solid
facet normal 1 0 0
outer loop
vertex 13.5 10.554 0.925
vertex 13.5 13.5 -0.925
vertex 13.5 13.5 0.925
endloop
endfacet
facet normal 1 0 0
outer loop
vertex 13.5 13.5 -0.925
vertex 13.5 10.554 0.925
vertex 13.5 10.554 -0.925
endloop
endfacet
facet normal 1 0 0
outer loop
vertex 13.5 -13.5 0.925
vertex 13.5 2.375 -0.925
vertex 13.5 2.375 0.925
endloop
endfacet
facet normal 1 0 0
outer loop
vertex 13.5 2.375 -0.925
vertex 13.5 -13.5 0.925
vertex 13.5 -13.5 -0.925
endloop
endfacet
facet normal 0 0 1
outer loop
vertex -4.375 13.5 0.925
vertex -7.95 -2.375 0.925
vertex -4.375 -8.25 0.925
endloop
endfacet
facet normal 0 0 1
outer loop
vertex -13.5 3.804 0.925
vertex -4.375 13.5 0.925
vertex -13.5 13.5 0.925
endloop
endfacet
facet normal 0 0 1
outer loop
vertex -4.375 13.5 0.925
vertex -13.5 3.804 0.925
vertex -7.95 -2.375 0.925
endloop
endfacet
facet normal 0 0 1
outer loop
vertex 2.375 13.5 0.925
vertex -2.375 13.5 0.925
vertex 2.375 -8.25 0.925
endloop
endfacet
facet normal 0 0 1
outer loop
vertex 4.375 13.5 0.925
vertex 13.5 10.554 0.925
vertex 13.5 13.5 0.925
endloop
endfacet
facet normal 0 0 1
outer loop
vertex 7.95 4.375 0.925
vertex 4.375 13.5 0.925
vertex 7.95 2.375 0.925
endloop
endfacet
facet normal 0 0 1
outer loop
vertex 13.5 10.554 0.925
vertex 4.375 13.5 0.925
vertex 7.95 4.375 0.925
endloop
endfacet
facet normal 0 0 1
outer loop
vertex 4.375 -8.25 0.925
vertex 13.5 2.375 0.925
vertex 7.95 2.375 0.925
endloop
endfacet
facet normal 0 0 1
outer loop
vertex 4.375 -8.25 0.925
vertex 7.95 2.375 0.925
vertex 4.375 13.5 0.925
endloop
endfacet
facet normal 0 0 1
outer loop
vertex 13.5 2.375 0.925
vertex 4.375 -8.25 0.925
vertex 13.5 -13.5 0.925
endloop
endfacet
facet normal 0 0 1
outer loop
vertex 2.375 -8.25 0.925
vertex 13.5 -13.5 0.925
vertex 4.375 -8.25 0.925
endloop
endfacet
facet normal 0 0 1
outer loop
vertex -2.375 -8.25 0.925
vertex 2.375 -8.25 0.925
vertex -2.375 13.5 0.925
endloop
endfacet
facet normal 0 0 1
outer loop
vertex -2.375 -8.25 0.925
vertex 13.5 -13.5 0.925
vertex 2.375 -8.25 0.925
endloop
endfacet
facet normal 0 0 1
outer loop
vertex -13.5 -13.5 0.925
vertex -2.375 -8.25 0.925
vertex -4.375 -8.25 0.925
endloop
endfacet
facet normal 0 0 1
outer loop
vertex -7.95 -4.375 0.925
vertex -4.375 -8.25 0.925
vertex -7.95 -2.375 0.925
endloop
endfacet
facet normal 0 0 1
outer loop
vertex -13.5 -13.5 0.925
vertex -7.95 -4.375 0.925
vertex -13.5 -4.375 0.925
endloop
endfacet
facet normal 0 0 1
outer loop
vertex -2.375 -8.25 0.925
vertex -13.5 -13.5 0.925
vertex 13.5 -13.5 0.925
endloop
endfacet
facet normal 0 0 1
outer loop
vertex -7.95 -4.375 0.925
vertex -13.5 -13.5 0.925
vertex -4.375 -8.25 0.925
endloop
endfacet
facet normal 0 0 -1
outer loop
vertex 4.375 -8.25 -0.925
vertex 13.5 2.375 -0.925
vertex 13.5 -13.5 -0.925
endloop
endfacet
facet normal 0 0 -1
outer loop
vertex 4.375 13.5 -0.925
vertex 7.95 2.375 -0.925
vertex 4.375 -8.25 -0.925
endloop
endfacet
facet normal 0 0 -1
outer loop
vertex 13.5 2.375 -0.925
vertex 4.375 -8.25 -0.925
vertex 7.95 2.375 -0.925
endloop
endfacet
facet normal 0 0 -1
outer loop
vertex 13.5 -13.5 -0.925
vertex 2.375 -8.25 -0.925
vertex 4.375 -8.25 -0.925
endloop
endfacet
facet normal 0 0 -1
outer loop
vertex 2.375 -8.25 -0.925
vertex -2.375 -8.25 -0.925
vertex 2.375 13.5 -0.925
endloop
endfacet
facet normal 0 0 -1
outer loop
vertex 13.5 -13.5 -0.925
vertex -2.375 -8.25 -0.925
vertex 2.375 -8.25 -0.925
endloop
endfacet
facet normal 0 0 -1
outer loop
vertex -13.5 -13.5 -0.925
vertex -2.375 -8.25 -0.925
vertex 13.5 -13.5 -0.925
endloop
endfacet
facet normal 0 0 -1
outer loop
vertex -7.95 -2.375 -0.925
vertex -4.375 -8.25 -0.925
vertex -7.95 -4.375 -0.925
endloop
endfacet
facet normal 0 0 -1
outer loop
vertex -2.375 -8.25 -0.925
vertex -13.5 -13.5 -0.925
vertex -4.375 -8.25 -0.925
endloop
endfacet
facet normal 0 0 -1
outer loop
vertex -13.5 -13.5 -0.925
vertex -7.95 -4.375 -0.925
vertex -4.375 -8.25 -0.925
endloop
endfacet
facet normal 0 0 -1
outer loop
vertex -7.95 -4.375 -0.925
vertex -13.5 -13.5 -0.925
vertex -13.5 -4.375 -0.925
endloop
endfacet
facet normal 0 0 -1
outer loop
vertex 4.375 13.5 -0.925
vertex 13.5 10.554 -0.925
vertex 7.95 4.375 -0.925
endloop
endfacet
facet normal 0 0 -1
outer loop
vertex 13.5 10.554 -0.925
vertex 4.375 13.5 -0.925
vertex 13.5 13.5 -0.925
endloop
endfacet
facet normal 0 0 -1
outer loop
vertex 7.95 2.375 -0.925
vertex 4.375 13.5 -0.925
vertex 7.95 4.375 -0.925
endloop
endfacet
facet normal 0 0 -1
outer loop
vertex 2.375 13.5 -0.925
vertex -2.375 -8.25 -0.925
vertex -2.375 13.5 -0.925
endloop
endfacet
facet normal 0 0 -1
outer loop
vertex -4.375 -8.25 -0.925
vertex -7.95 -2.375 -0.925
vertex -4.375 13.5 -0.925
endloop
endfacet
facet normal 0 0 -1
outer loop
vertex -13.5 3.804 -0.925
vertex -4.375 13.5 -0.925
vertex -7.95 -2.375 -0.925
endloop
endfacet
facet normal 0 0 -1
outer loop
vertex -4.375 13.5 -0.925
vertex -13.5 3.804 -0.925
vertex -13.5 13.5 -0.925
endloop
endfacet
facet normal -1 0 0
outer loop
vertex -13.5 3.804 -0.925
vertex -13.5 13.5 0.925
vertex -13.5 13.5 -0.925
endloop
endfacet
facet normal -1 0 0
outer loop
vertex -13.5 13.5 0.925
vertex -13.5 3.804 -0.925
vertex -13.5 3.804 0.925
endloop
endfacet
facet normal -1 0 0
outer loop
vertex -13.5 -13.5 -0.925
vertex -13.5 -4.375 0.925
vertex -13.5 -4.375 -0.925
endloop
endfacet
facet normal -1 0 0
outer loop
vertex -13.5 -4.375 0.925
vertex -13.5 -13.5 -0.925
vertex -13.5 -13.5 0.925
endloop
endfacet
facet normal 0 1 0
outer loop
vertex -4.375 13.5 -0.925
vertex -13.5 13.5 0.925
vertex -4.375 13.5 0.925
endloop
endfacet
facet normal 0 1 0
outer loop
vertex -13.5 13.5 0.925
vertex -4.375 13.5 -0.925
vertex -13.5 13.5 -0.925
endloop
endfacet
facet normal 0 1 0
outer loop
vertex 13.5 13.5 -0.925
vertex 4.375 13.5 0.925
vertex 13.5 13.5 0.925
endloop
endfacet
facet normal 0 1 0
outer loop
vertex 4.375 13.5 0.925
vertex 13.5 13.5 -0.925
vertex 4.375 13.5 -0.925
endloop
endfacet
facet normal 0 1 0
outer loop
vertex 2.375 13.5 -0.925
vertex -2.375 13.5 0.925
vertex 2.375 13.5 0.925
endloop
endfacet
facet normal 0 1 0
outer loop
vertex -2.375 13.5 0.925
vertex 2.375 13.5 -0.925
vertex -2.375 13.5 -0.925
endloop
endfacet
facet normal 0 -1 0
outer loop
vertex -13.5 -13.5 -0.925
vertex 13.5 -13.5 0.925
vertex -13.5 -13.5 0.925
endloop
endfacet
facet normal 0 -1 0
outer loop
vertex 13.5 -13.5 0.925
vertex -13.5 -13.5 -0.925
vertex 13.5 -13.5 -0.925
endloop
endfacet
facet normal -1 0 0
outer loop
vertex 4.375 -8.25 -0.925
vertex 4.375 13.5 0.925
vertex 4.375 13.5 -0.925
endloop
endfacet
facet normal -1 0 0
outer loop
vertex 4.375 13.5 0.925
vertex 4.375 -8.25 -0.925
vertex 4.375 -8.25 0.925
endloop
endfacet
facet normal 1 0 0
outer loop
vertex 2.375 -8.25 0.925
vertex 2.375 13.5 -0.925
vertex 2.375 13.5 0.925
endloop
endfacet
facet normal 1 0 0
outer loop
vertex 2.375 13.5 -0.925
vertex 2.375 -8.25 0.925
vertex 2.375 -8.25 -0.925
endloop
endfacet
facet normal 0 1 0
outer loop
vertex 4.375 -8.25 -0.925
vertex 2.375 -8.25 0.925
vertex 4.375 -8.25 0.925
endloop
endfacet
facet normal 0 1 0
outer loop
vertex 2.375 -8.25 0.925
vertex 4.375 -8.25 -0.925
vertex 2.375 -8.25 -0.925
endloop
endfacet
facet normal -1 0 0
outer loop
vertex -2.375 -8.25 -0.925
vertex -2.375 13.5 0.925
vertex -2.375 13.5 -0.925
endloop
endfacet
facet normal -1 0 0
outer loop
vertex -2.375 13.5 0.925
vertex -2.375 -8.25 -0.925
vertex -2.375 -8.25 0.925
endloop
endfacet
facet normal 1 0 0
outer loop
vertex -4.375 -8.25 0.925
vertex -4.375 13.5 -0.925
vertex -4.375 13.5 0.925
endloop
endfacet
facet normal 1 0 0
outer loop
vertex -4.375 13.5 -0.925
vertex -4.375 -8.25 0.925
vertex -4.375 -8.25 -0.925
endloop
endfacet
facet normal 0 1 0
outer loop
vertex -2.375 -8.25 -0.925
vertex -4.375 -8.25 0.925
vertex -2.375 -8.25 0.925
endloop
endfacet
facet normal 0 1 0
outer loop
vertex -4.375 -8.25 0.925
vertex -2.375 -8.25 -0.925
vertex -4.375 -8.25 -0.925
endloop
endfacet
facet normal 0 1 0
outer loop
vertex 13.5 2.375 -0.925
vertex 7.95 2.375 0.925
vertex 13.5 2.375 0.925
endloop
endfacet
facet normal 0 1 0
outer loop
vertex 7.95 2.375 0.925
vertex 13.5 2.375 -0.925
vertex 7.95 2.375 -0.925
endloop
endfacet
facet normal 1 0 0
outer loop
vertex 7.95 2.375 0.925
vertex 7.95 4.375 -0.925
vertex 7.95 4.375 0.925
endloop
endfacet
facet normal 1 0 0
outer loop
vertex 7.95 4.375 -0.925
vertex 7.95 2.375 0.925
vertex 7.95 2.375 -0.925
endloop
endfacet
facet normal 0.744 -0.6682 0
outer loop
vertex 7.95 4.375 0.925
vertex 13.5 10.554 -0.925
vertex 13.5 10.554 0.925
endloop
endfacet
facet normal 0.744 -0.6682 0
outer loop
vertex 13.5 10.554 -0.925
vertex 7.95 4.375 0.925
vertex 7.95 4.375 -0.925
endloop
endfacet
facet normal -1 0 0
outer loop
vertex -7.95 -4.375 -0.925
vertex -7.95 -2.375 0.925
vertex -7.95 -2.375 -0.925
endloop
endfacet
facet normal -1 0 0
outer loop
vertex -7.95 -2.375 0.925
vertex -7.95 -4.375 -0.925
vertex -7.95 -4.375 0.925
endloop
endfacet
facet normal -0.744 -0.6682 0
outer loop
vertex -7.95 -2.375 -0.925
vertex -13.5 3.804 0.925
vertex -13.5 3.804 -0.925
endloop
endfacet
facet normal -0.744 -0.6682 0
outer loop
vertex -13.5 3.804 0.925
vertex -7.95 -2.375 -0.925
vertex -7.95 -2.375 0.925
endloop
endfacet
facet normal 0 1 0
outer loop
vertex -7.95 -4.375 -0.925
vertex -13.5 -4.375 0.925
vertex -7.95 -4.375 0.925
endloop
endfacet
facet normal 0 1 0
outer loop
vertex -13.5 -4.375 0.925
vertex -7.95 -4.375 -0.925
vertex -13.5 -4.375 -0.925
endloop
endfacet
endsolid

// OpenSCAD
// Width, height of the piece (millimeters)
size = 27; // [1:1:200]

// Material thickness
t = 1.85; // [0.2:0.05:20]

// Extra width of gaps w.r.t thickness
tolerance = 0.15; // [0:0.01:1]

// Distance between panels
w = 1.25; // [0.7:0.05:2.0]

/* [Hidden] */
rsize=size/10;
tol=tolerance/rsize;
tr=t/rsize;

//generate printable model
scale([rsize,rsize,rsize]) bit(); 

//example of animating the assembly
//anime=-10+$t*10; scale([rsize,rsize,rsize]) part();

//example of projection for exporting dxf
//projection(cut = false) scale([rsize,rsize,rsize]) bit();

module bit() {
	difference() {
		cube([10,10,tr], center=true);
		
#		translate([w,2,0])cube([tr+tol,10+tol*2,2], center=true);
#		translate([-w,2,0])cube([tr+tol,10+tol*2,2], center=true);
#		translate([8,w,0]) slot();
#		mirror([1,0,0]) translate([8,-w,0]) slot();
	}
}

module slot() {
	hull() {
		cube([10+tol*2,tr+tol,2], center=true);
		mirror([0,0,1])translate([-3.4,1.2,0])rotate([0,0,55]) cube([3,1,2], center=true);
		
	}
}

module part() {
	translate([0,anime,w]) bit();
	rotate([0,0,180]) translate([0,anime,-w]) bit();
	translate([anime,-w,0]) rotate([-90,-90,0]) bit();
	rotate([0,0,180]) translate([anime,-w,0]) rotate([90,90,0]) bit();
	rotate([-90,0,90]) translate([0,anime,-w]) bit();
    rotate([90,0,0]) rotate([0,-90,0]) translate([0,anime,w]) bit();
}
